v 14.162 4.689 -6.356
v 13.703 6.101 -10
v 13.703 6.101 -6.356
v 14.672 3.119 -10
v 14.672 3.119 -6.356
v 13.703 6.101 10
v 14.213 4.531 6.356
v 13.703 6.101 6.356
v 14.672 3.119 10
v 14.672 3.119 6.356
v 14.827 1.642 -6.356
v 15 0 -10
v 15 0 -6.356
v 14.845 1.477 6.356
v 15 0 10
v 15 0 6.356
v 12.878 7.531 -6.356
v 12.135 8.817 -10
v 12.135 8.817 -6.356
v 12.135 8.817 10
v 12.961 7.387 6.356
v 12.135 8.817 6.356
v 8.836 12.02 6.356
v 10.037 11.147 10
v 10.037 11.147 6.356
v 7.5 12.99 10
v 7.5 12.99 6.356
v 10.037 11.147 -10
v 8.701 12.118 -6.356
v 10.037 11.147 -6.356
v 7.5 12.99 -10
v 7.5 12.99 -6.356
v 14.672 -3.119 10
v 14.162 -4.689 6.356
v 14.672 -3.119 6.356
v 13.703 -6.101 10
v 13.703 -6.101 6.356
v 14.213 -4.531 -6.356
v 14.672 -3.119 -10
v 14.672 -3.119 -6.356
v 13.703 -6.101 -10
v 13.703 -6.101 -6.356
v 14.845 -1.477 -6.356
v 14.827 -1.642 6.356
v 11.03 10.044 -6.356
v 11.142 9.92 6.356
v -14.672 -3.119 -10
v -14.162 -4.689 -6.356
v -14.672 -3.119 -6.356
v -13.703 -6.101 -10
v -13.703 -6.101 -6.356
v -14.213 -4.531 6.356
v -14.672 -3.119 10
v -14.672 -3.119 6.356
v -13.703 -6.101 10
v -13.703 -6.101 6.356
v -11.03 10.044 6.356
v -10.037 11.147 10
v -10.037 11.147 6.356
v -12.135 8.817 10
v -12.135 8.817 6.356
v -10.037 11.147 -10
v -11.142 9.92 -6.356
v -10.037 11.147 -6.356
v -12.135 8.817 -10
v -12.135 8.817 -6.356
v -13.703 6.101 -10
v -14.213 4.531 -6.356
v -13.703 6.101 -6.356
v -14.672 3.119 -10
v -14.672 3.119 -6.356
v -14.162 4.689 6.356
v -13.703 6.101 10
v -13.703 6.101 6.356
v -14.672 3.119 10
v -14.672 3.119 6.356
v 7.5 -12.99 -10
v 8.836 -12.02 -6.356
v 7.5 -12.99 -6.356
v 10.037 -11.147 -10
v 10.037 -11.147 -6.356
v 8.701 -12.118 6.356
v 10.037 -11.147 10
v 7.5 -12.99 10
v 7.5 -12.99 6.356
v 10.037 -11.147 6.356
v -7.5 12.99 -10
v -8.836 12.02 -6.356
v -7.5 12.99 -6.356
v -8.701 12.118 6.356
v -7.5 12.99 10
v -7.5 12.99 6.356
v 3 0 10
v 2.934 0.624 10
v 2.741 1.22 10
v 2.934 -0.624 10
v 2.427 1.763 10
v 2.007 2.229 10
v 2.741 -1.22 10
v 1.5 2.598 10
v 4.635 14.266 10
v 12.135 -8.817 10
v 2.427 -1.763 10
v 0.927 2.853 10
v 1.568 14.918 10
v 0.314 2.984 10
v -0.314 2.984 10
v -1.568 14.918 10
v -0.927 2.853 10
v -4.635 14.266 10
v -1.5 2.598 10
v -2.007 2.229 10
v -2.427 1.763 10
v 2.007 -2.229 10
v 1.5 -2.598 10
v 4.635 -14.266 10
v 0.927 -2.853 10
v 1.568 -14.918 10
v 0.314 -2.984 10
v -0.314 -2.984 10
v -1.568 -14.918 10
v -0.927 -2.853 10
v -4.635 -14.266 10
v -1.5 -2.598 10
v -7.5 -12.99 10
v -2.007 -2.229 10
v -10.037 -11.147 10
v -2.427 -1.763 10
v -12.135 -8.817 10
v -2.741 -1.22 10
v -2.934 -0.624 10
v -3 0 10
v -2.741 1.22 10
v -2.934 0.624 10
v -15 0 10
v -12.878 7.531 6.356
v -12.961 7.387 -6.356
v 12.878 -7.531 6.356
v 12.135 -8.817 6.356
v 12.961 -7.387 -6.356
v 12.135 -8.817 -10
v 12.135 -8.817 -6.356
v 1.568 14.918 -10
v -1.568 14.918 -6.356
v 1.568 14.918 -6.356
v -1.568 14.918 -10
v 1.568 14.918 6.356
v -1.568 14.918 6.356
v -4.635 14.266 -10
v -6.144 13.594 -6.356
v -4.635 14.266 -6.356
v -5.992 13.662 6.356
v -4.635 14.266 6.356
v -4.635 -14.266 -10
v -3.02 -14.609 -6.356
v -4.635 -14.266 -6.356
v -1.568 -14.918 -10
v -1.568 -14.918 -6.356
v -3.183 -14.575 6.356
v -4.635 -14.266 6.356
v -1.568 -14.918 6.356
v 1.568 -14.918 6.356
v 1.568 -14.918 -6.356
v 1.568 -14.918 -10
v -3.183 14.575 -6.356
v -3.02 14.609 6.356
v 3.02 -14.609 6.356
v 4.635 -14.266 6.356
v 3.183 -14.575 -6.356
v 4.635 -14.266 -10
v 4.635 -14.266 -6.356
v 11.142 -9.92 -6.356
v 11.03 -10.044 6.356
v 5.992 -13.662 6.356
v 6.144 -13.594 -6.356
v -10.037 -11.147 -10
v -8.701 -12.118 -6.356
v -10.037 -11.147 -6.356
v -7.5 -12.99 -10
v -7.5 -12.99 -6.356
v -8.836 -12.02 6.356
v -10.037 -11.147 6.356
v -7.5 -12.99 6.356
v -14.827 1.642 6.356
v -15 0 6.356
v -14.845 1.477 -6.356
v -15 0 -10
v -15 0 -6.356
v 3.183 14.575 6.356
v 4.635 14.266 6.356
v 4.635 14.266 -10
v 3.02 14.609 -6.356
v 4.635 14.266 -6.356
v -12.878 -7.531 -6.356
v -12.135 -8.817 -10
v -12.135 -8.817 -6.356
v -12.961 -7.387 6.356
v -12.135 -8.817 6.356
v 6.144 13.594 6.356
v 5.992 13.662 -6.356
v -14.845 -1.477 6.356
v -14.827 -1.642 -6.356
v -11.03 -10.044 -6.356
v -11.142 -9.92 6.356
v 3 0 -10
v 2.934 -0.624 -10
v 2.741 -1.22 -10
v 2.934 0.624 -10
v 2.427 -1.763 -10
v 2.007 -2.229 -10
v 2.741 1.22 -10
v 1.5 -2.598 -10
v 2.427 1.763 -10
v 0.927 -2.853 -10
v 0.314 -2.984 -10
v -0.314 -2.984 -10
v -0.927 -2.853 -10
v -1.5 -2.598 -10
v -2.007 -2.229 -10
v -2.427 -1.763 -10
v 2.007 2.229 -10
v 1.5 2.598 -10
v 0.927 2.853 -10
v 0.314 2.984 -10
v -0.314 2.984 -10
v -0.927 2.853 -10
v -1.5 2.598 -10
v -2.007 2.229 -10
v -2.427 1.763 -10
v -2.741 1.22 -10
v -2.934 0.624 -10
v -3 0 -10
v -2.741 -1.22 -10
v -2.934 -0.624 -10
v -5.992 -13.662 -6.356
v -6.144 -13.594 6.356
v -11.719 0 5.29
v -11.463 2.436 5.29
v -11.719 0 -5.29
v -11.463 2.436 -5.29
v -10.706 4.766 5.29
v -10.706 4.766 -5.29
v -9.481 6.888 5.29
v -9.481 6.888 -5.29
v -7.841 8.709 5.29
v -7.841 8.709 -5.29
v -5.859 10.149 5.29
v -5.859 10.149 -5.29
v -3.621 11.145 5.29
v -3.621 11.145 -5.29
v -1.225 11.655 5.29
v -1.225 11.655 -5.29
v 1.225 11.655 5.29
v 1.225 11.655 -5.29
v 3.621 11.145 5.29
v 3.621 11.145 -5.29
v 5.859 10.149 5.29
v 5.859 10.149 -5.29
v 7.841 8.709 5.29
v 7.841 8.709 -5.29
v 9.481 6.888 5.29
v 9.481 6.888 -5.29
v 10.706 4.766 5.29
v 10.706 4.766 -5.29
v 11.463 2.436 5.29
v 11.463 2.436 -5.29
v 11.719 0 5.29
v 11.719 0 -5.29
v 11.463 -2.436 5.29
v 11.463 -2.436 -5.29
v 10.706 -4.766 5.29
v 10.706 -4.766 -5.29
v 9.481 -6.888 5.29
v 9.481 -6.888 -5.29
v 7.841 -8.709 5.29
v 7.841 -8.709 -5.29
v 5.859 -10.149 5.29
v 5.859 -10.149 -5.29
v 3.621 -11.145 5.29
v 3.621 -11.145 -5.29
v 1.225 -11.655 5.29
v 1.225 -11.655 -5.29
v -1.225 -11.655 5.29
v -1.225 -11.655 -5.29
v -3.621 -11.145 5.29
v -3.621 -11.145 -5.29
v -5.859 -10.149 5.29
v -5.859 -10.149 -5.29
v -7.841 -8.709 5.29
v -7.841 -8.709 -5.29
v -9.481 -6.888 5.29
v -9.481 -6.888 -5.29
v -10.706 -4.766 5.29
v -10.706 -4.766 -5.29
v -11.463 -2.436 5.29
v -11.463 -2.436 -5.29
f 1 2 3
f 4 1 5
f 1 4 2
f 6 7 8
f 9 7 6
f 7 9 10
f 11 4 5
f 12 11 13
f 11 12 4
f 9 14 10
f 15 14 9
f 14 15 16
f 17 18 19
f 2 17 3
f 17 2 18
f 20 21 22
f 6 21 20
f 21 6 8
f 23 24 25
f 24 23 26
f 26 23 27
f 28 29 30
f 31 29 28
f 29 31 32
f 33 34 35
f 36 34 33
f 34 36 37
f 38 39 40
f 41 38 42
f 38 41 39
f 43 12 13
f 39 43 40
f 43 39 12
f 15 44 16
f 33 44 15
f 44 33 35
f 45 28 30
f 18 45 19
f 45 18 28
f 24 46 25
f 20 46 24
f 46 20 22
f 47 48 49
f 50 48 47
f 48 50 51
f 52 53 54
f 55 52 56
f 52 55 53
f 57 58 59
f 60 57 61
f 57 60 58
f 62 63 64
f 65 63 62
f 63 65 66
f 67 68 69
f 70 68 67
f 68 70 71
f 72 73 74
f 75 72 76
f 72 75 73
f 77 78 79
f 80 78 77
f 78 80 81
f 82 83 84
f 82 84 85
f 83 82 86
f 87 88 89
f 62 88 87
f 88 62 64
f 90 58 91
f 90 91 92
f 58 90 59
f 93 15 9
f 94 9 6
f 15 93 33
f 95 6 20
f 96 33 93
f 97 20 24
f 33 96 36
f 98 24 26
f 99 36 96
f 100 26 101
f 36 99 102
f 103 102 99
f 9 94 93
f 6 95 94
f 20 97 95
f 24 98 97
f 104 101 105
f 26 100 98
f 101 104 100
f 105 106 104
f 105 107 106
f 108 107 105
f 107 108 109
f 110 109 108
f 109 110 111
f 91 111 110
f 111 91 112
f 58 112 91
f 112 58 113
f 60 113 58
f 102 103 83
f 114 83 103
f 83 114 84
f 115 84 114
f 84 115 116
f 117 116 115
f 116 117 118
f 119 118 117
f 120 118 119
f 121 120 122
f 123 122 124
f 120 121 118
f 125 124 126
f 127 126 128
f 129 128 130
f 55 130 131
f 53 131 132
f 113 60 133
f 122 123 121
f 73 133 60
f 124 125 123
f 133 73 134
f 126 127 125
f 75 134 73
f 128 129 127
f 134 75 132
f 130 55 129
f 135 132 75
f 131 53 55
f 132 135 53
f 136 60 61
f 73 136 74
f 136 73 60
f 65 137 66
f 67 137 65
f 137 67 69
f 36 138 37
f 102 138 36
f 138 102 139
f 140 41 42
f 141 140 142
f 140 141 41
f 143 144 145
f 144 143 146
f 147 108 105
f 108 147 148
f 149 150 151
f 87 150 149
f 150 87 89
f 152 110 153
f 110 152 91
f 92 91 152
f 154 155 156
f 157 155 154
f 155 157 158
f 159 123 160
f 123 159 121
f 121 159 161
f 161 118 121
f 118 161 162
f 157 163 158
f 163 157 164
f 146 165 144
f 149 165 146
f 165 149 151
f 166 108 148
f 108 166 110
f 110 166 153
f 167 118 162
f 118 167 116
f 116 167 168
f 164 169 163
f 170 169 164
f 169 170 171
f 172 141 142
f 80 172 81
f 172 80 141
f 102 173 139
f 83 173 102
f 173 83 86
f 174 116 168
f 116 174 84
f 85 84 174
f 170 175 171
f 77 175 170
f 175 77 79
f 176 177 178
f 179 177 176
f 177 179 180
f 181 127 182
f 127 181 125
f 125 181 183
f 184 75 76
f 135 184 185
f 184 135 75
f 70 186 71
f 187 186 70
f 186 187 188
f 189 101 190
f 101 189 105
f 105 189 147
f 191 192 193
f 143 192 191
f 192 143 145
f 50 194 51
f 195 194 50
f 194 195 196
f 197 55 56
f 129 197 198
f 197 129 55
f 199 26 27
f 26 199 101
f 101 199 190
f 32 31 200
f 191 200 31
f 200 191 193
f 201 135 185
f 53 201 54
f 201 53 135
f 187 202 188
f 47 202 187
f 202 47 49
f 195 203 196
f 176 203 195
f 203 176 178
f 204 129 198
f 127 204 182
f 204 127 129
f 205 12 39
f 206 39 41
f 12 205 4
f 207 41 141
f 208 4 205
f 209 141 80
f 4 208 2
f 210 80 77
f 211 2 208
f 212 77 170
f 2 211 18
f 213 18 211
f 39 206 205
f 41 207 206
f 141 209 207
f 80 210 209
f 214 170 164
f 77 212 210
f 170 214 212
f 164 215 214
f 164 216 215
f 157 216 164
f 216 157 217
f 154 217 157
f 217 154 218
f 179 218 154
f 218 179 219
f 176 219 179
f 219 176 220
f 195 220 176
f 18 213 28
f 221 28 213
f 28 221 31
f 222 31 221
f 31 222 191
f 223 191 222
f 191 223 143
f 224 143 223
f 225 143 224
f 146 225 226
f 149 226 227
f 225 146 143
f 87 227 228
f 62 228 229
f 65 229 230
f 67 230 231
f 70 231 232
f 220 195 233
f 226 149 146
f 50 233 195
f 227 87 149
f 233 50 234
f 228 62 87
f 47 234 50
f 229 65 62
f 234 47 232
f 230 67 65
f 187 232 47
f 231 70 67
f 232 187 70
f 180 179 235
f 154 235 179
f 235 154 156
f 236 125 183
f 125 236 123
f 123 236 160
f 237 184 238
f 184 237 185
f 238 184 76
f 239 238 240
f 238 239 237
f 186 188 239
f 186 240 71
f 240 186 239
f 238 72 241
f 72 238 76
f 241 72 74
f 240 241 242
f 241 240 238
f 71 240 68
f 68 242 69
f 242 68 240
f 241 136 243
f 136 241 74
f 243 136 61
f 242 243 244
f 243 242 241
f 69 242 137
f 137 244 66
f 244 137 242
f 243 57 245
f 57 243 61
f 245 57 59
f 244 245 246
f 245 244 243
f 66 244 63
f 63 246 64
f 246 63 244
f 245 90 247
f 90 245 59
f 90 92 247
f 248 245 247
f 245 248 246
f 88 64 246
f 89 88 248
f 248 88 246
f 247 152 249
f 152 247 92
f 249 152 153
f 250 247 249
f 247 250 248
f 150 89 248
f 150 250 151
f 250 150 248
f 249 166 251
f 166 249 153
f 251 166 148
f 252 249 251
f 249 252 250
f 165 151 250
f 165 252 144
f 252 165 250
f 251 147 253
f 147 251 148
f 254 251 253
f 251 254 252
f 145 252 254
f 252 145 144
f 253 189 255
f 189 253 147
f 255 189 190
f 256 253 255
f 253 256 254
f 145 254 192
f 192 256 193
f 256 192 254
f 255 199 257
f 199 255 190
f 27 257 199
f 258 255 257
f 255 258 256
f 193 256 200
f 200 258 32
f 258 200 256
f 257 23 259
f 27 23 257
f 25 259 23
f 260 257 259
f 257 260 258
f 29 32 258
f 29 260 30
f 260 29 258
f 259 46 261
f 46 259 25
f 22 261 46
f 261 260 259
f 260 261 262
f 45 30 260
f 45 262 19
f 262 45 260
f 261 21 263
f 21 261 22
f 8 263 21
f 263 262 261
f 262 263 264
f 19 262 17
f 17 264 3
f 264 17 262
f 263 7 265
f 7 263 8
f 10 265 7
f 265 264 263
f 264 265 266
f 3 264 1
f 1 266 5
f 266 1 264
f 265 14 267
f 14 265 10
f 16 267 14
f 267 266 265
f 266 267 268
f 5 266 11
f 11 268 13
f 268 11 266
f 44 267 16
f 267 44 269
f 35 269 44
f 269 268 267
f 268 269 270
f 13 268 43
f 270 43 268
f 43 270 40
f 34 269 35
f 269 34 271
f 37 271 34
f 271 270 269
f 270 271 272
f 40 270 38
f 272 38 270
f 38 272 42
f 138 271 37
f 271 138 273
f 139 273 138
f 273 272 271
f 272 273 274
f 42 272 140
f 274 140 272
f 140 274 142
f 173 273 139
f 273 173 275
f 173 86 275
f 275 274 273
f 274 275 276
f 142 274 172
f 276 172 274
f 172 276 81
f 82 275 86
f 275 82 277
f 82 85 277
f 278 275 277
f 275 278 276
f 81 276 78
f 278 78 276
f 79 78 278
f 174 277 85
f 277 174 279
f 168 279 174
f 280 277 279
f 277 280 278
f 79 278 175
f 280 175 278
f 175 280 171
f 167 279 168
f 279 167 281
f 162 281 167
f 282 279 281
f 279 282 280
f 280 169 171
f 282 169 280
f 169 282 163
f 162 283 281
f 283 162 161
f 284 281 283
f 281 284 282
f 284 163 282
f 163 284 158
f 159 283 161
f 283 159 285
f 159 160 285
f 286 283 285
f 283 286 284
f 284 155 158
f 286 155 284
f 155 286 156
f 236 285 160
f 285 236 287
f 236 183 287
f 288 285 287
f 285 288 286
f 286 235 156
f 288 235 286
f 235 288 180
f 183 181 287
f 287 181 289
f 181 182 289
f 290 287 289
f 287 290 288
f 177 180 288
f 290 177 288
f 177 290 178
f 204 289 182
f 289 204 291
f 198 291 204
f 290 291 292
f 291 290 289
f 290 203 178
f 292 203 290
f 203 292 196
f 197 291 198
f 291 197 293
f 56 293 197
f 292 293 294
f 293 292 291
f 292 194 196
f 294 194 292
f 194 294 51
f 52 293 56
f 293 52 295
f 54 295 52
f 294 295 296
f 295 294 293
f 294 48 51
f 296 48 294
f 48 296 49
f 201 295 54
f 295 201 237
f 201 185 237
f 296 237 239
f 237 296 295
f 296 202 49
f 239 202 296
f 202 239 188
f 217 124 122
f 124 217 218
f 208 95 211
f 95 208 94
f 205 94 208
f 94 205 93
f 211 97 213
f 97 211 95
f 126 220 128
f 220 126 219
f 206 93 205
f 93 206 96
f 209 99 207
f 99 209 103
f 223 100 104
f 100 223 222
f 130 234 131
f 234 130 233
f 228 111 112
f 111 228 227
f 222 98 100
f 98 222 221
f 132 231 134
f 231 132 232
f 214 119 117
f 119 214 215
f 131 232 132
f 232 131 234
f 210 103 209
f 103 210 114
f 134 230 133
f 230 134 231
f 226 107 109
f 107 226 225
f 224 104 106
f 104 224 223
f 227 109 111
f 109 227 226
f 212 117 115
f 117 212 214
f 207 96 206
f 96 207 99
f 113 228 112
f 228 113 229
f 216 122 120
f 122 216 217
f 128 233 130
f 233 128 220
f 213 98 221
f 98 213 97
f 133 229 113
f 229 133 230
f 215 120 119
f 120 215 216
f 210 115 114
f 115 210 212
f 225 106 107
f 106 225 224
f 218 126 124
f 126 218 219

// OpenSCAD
$fn=30;
radius_bar =9; //mm
bend_radius =10; //long wheel 


module Carrier_Wheel_axle(){
    cylinder(r=2,h=30,center=true);  

}    

 module Carrier_Wheel(){

    difference() {
        cylinder(r=15,h=20,center=true);

        rotate_extrude()
        translate([bend_radius + radius_bar, 0, 0])
            circle(r=radius_bar,$fn=5);

        cylinder(r=6/2,h=20,center=true);
     }
}

Carrier_Wheel();

%Carrier_Wheel_axle();
